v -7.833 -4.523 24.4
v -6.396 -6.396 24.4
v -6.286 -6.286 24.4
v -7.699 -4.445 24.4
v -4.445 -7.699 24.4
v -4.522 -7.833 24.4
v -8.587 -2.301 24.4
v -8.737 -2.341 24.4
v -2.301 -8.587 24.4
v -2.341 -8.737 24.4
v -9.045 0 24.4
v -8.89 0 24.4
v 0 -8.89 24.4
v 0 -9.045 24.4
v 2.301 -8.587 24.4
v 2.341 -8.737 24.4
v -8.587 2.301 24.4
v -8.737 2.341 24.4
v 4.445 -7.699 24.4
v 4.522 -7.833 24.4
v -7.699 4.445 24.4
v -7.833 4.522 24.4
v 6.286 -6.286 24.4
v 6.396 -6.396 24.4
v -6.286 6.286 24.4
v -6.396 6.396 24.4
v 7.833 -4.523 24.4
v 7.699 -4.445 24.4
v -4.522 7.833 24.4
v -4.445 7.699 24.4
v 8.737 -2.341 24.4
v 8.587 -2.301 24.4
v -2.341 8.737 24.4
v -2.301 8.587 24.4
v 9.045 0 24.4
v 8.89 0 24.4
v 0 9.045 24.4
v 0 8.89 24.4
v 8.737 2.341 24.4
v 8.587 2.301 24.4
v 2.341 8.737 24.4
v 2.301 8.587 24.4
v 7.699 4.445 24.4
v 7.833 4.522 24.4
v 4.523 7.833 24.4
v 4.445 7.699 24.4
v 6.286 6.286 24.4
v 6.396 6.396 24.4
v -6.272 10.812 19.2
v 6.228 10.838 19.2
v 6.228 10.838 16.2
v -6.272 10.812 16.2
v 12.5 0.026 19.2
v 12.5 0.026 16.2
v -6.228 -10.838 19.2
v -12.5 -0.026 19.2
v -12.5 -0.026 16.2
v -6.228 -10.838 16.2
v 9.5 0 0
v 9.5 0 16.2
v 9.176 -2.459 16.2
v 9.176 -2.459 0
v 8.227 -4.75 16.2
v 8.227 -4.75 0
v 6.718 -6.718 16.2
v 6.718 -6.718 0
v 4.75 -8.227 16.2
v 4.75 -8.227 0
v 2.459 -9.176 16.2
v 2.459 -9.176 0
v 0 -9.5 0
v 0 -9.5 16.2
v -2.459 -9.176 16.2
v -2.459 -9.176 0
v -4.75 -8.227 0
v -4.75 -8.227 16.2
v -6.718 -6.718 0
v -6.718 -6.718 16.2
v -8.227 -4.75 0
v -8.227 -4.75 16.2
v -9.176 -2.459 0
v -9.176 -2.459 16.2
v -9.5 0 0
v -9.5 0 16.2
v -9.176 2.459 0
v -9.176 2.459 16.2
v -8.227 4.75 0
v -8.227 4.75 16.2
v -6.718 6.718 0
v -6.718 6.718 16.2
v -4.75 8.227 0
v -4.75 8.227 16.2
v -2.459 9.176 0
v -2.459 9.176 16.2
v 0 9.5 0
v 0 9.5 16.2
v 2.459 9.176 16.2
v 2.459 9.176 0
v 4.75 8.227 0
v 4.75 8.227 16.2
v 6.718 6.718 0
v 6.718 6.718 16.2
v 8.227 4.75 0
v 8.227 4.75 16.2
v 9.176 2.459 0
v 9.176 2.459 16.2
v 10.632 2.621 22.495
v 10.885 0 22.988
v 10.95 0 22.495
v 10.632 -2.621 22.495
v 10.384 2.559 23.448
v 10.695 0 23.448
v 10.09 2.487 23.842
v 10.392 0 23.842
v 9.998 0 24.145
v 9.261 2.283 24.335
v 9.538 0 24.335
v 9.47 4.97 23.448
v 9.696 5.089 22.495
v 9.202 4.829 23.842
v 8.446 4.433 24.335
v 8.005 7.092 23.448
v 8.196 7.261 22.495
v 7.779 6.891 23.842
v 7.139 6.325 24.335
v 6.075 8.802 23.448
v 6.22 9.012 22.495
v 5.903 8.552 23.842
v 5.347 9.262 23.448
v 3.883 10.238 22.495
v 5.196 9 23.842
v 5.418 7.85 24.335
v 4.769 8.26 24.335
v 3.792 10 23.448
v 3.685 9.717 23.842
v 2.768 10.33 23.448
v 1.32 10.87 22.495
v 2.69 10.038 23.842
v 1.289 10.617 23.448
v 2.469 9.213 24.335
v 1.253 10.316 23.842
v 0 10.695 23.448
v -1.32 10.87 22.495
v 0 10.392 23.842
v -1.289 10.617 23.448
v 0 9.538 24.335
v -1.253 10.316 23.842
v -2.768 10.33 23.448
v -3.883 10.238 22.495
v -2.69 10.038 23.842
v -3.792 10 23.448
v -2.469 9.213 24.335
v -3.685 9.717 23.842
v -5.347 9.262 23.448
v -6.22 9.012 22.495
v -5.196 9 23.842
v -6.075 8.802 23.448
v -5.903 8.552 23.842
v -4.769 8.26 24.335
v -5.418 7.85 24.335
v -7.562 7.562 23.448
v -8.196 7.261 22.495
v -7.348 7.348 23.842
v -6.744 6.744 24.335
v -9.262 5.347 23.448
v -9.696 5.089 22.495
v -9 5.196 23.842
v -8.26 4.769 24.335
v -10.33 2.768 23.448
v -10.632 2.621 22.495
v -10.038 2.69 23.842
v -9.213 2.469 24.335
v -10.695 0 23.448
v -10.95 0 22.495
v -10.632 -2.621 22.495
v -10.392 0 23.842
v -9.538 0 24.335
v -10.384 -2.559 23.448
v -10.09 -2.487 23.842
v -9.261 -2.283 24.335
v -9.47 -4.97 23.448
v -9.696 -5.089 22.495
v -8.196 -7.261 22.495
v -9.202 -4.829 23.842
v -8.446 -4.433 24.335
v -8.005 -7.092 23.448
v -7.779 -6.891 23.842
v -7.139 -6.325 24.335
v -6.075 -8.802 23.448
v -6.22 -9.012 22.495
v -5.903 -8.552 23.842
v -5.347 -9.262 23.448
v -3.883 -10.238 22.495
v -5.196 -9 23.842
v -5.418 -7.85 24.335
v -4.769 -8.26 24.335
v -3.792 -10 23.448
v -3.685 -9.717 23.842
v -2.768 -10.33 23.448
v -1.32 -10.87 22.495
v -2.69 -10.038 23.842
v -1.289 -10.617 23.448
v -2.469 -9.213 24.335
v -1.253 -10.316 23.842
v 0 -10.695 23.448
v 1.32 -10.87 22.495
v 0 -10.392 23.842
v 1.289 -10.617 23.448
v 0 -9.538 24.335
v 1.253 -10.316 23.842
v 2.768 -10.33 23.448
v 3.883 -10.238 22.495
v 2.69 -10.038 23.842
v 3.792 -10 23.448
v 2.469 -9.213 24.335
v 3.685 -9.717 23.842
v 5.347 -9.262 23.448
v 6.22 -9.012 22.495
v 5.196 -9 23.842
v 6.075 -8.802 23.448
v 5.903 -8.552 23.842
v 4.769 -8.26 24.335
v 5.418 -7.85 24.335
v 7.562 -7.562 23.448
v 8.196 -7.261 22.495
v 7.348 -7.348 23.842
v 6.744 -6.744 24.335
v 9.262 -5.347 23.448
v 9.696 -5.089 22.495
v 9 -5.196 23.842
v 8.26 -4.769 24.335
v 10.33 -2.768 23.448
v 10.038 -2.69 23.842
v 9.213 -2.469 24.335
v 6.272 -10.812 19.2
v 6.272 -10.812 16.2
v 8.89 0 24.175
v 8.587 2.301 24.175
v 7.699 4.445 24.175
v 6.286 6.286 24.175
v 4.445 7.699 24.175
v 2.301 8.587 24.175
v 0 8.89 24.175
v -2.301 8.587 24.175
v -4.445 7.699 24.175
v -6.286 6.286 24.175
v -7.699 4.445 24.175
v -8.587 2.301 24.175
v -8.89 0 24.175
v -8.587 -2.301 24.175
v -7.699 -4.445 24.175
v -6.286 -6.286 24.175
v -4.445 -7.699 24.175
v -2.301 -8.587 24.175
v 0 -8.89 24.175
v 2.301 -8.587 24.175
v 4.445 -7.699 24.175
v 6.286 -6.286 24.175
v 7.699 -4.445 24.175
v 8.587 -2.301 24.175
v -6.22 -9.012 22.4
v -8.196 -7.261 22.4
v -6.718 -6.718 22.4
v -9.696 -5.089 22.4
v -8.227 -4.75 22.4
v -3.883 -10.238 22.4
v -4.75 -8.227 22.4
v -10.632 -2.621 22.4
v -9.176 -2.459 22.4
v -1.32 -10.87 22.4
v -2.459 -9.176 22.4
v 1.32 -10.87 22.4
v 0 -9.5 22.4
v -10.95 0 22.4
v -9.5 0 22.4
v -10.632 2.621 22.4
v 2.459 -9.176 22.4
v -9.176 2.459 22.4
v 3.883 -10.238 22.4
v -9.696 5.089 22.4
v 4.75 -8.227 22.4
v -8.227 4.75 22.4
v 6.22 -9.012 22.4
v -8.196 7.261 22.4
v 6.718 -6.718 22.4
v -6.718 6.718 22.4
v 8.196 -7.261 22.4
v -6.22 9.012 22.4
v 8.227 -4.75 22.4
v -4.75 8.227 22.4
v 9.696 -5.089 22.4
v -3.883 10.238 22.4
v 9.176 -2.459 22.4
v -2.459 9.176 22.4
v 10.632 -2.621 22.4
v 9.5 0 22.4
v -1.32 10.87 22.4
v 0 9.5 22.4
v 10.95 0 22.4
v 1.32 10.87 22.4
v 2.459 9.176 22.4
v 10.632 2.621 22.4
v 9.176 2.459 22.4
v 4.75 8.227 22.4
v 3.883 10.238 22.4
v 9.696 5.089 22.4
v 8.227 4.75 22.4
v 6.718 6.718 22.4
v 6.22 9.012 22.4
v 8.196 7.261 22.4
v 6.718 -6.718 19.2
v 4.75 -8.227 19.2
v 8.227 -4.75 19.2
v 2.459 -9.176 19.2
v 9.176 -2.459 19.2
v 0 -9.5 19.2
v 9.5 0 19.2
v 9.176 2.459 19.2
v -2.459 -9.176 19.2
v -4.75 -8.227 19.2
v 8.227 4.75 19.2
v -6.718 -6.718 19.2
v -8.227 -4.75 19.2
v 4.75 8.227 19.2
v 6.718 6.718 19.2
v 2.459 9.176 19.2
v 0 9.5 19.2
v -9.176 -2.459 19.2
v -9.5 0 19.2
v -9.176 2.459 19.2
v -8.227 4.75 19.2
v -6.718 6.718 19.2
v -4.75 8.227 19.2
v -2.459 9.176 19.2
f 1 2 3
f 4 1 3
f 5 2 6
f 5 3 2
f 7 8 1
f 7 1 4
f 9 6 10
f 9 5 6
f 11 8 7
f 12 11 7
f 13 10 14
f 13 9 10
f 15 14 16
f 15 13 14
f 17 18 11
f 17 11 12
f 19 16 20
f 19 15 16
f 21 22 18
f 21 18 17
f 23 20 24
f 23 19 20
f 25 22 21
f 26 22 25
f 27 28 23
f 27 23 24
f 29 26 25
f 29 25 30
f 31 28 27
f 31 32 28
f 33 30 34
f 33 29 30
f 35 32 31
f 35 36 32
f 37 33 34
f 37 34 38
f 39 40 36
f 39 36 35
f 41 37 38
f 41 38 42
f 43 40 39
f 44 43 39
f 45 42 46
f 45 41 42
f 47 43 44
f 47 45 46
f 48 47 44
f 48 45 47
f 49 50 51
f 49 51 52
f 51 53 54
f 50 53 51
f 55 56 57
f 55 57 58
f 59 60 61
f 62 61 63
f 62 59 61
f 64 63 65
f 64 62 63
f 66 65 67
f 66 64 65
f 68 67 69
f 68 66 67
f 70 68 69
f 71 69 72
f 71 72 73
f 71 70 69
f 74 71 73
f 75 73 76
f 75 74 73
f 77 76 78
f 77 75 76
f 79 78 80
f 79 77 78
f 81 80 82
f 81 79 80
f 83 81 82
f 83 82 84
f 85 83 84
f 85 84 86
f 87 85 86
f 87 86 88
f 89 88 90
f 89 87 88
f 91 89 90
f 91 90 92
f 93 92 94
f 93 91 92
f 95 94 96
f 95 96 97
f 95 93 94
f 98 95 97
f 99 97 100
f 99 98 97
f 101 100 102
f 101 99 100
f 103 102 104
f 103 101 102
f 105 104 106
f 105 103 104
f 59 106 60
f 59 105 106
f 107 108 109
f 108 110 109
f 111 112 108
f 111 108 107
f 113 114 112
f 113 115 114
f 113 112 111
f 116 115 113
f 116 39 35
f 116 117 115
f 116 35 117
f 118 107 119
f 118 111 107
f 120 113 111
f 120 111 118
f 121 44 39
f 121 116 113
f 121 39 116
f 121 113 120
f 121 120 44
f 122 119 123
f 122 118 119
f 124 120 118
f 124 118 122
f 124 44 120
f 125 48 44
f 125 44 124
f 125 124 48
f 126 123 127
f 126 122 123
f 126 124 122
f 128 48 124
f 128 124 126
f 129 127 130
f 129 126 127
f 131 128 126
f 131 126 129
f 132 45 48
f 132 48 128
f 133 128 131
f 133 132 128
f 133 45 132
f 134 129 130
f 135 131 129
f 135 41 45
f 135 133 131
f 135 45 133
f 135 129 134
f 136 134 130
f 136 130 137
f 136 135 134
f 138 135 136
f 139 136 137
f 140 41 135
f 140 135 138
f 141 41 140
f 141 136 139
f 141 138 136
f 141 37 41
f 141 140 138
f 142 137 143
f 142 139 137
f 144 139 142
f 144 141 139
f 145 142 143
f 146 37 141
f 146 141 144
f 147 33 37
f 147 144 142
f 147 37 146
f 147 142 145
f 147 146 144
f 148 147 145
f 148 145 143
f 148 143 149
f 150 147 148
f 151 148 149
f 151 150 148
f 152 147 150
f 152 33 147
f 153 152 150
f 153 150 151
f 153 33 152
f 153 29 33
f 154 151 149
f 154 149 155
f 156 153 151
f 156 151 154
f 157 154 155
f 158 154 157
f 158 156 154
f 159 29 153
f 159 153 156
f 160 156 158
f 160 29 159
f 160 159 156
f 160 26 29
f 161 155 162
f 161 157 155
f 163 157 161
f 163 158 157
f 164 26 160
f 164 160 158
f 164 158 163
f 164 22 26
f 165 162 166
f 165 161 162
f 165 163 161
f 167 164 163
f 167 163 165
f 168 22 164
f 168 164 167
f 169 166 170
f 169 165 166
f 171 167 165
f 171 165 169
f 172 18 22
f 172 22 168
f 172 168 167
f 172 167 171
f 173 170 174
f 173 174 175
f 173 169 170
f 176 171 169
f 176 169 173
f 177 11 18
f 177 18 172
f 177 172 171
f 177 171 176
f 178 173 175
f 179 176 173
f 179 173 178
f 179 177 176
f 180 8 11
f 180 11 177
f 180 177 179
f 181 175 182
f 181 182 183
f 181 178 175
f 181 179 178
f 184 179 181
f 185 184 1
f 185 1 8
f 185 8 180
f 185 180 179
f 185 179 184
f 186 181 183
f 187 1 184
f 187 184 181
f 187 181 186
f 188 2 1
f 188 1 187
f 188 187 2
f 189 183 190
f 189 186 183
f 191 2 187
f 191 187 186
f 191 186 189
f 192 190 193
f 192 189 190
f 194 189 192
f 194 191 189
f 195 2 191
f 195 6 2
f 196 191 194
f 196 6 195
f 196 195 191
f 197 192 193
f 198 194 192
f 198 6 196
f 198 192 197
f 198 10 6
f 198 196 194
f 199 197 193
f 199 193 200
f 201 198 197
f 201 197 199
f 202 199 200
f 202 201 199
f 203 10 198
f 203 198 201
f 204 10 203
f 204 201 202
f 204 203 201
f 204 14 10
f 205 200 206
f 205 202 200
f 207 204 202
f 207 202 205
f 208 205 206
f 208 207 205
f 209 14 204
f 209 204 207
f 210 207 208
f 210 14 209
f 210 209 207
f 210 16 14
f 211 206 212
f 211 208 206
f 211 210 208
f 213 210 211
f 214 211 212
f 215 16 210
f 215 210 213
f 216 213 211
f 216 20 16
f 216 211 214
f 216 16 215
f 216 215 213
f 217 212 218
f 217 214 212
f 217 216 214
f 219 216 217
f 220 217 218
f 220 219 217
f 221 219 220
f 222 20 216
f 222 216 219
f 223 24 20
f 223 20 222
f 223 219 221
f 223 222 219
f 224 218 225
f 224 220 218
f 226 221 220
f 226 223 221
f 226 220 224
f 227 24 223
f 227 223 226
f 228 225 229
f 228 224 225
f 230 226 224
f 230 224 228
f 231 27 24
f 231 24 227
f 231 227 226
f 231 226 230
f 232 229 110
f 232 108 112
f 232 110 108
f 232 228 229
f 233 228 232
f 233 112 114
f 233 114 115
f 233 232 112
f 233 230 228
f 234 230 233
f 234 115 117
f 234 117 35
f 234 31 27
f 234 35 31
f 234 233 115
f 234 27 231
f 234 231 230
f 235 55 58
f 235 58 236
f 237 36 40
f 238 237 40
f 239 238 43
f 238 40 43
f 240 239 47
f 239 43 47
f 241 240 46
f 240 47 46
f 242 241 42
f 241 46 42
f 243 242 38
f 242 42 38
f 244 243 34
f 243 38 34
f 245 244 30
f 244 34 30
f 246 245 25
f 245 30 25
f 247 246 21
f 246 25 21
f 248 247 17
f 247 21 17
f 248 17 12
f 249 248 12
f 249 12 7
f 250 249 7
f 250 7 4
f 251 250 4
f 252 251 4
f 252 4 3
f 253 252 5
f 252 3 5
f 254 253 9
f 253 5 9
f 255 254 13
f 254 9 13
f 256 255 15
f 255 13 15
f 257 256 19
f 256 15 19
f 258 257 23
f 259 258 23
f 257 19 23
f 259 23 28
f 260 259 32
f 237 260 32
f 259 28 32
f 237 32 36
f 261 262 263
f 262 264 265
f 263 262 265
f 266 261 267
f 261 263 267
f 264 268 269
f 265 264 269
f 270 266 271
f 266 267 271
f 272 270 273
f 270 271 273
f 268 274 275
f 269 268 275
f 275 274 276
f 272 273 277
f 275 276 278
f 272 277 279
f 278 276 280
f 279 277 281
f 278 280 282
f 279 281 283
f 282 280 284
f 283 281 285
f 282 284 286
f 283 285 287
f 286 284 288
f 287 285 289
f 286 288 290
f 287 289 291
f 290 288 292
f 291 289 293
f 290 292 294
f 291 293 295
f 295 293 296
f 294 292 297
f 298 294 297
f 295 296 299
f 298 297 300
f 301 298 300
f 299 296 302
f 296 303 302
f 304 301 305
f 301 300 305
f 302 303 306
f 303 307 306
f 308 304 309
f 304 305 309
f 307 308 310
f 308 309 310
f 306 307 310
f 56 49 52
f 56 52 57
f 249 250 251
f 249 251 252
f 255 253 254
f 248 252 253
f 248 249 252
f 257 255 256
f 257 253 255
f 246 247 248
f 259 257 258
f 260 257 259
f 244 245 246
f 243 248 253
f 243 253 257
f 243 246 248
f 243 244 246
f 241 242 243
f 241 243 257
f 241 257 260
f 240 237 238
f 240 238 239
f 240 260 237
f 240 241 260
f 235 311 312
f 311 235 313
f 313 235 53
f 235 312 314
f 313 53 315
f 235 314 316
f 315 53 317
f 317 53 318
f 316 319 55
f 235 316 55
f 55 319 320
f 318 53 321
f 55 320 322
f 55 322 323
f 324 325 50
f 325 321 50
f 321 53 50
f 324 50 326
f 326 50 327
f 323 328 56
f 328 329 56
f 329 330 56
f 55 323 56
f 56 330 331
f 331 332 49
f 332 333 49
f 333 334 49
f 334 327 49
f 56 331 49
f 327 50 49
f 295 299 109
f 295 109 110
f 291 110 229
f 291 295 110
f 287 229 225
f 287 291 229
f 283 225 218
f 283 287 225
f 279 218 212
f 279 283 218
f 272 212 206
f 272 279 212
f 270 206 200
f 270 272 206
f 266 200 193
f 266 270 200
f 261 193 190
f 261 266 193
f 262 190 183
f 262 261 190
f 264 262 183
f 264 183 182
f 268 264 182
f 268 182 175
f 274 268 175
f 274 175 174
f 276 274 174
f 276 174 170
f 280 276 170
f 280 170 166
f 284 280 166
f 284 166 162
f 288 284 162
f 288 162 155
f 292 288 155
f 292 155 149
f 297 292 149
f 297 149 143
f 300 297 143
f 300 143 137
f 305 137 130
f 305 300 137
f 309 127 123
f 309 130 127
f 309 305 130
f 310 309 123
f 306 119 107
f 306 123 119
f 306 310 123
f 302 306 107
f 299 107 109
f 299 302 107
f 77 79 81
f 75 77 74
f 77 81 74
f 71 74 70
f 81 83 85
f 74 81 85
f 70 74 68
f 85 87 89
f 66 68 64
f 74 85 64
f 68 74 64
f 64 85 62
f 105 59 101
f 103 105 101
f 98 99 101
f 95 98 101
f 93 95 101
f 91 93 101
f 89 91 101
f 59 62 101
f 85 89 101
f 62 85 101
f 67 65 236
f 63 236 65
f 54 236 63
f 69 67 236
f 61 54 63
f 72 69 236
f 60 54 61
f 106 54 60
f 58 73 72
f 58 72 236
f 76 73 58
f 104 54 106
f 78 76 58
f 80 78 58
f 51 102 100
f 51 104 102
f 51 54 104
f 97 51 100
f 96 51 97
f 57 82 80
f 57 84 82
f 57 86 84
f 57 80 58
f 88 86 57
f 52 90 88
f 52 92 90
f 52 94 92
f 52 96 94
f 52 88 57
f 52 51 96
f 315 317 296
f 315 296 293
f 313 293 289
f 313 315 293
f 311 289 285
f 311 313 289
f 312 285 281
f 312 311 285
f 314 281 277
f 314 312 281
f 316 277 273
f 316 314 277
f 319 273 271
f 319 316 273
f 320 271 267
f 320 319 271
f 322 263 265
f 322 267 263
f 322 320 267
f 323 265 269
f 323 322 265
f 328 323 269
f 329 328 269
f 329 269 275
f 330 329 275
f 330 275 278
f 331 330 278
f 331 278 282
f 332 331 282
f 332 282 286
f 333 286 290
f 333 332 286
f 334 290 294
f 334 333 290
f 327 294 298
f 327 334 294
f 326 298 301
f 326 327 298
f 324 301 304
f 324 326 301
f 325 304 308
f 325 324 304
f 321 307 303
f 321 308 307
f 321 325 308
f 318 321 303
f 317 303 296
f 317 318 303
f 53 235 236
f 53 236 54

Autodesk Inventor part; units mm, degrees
ref_plane "YZ Plane" through (0, 0, 0) normal (1, 0, 0) x (0, 1, 0)
ref_plane "XZ Plane" through (0, 0, 0) normal (0, 1, 0) x (-1, 0, 0)
sketch "Sketch3" plane through (0, 0, 0) normal (0, 0, 1) x (1, 0, 0)
  circle A0 centre (0, 0) radius 9.5
  dimension "d3" = 19
extrude "Extrusion2" add sketch "Sketch3" along normal blind 22.4
sketch "Sketch4" plane through (0, 0, 22.4) normal (0, 0, 1) x (1, 0, 0)
  circle A0 centre (0, 0) radius 10.95
  dimension "d6" = 21.9
extrude "Extrusion3" add sketch "Sketch4" along normal blind 2
sketch "Sketch5" plane through (0, 0, 24.4) normal (0, 0, 1) x (1, 0, 0)
  circle A0 centre (0, 0) radius 8.89
  dimension "d10" = 17.78
fillet "Fillet1" radius 1.905 1 edges at (-10.95, 0, 24.4)
ref_plane "Work Plane3" through (0, 0, 19.2) normal (0, 0, -1) x (-1, 0, 0)
sketch "Sketch6" plane through (0, 0, 19.2) normal (0, 0, -1) x (-1, 0, 0)
  line L0 (6.2278, -10.8381) -> (-6.2721, -10.8125)
  line L1 (-6.2721, -10.8125) -> (-12.5, 0.0256)
  line L2 (-12.5, 0.0256) -> (-6.2278, 10.8381)
  line L3 (-6.2278, 10.8381) -> (6.2721, 10.8125)
  line L4 (6.2721, 10.8125) -> (12.5, -0.0256)
  line L5 (12.5, -0.0256) -> (6.2278, -10.8381)
  point P0 (0, 0)
  point P1 (0, 0)
  dimension "d13" = 25
  dimension "d14" = 10.8125
extrude "Extrusion4" add sketch "Sketch6" along normal blind 3
extrude "Extrusion5" cut sketch "Sketch5" against normal blind 0.225
thread "Thread2" size "M20x2.5" class "6g" standard "ANSI Metric M Profile" length 25.4
properties part number "Button"
